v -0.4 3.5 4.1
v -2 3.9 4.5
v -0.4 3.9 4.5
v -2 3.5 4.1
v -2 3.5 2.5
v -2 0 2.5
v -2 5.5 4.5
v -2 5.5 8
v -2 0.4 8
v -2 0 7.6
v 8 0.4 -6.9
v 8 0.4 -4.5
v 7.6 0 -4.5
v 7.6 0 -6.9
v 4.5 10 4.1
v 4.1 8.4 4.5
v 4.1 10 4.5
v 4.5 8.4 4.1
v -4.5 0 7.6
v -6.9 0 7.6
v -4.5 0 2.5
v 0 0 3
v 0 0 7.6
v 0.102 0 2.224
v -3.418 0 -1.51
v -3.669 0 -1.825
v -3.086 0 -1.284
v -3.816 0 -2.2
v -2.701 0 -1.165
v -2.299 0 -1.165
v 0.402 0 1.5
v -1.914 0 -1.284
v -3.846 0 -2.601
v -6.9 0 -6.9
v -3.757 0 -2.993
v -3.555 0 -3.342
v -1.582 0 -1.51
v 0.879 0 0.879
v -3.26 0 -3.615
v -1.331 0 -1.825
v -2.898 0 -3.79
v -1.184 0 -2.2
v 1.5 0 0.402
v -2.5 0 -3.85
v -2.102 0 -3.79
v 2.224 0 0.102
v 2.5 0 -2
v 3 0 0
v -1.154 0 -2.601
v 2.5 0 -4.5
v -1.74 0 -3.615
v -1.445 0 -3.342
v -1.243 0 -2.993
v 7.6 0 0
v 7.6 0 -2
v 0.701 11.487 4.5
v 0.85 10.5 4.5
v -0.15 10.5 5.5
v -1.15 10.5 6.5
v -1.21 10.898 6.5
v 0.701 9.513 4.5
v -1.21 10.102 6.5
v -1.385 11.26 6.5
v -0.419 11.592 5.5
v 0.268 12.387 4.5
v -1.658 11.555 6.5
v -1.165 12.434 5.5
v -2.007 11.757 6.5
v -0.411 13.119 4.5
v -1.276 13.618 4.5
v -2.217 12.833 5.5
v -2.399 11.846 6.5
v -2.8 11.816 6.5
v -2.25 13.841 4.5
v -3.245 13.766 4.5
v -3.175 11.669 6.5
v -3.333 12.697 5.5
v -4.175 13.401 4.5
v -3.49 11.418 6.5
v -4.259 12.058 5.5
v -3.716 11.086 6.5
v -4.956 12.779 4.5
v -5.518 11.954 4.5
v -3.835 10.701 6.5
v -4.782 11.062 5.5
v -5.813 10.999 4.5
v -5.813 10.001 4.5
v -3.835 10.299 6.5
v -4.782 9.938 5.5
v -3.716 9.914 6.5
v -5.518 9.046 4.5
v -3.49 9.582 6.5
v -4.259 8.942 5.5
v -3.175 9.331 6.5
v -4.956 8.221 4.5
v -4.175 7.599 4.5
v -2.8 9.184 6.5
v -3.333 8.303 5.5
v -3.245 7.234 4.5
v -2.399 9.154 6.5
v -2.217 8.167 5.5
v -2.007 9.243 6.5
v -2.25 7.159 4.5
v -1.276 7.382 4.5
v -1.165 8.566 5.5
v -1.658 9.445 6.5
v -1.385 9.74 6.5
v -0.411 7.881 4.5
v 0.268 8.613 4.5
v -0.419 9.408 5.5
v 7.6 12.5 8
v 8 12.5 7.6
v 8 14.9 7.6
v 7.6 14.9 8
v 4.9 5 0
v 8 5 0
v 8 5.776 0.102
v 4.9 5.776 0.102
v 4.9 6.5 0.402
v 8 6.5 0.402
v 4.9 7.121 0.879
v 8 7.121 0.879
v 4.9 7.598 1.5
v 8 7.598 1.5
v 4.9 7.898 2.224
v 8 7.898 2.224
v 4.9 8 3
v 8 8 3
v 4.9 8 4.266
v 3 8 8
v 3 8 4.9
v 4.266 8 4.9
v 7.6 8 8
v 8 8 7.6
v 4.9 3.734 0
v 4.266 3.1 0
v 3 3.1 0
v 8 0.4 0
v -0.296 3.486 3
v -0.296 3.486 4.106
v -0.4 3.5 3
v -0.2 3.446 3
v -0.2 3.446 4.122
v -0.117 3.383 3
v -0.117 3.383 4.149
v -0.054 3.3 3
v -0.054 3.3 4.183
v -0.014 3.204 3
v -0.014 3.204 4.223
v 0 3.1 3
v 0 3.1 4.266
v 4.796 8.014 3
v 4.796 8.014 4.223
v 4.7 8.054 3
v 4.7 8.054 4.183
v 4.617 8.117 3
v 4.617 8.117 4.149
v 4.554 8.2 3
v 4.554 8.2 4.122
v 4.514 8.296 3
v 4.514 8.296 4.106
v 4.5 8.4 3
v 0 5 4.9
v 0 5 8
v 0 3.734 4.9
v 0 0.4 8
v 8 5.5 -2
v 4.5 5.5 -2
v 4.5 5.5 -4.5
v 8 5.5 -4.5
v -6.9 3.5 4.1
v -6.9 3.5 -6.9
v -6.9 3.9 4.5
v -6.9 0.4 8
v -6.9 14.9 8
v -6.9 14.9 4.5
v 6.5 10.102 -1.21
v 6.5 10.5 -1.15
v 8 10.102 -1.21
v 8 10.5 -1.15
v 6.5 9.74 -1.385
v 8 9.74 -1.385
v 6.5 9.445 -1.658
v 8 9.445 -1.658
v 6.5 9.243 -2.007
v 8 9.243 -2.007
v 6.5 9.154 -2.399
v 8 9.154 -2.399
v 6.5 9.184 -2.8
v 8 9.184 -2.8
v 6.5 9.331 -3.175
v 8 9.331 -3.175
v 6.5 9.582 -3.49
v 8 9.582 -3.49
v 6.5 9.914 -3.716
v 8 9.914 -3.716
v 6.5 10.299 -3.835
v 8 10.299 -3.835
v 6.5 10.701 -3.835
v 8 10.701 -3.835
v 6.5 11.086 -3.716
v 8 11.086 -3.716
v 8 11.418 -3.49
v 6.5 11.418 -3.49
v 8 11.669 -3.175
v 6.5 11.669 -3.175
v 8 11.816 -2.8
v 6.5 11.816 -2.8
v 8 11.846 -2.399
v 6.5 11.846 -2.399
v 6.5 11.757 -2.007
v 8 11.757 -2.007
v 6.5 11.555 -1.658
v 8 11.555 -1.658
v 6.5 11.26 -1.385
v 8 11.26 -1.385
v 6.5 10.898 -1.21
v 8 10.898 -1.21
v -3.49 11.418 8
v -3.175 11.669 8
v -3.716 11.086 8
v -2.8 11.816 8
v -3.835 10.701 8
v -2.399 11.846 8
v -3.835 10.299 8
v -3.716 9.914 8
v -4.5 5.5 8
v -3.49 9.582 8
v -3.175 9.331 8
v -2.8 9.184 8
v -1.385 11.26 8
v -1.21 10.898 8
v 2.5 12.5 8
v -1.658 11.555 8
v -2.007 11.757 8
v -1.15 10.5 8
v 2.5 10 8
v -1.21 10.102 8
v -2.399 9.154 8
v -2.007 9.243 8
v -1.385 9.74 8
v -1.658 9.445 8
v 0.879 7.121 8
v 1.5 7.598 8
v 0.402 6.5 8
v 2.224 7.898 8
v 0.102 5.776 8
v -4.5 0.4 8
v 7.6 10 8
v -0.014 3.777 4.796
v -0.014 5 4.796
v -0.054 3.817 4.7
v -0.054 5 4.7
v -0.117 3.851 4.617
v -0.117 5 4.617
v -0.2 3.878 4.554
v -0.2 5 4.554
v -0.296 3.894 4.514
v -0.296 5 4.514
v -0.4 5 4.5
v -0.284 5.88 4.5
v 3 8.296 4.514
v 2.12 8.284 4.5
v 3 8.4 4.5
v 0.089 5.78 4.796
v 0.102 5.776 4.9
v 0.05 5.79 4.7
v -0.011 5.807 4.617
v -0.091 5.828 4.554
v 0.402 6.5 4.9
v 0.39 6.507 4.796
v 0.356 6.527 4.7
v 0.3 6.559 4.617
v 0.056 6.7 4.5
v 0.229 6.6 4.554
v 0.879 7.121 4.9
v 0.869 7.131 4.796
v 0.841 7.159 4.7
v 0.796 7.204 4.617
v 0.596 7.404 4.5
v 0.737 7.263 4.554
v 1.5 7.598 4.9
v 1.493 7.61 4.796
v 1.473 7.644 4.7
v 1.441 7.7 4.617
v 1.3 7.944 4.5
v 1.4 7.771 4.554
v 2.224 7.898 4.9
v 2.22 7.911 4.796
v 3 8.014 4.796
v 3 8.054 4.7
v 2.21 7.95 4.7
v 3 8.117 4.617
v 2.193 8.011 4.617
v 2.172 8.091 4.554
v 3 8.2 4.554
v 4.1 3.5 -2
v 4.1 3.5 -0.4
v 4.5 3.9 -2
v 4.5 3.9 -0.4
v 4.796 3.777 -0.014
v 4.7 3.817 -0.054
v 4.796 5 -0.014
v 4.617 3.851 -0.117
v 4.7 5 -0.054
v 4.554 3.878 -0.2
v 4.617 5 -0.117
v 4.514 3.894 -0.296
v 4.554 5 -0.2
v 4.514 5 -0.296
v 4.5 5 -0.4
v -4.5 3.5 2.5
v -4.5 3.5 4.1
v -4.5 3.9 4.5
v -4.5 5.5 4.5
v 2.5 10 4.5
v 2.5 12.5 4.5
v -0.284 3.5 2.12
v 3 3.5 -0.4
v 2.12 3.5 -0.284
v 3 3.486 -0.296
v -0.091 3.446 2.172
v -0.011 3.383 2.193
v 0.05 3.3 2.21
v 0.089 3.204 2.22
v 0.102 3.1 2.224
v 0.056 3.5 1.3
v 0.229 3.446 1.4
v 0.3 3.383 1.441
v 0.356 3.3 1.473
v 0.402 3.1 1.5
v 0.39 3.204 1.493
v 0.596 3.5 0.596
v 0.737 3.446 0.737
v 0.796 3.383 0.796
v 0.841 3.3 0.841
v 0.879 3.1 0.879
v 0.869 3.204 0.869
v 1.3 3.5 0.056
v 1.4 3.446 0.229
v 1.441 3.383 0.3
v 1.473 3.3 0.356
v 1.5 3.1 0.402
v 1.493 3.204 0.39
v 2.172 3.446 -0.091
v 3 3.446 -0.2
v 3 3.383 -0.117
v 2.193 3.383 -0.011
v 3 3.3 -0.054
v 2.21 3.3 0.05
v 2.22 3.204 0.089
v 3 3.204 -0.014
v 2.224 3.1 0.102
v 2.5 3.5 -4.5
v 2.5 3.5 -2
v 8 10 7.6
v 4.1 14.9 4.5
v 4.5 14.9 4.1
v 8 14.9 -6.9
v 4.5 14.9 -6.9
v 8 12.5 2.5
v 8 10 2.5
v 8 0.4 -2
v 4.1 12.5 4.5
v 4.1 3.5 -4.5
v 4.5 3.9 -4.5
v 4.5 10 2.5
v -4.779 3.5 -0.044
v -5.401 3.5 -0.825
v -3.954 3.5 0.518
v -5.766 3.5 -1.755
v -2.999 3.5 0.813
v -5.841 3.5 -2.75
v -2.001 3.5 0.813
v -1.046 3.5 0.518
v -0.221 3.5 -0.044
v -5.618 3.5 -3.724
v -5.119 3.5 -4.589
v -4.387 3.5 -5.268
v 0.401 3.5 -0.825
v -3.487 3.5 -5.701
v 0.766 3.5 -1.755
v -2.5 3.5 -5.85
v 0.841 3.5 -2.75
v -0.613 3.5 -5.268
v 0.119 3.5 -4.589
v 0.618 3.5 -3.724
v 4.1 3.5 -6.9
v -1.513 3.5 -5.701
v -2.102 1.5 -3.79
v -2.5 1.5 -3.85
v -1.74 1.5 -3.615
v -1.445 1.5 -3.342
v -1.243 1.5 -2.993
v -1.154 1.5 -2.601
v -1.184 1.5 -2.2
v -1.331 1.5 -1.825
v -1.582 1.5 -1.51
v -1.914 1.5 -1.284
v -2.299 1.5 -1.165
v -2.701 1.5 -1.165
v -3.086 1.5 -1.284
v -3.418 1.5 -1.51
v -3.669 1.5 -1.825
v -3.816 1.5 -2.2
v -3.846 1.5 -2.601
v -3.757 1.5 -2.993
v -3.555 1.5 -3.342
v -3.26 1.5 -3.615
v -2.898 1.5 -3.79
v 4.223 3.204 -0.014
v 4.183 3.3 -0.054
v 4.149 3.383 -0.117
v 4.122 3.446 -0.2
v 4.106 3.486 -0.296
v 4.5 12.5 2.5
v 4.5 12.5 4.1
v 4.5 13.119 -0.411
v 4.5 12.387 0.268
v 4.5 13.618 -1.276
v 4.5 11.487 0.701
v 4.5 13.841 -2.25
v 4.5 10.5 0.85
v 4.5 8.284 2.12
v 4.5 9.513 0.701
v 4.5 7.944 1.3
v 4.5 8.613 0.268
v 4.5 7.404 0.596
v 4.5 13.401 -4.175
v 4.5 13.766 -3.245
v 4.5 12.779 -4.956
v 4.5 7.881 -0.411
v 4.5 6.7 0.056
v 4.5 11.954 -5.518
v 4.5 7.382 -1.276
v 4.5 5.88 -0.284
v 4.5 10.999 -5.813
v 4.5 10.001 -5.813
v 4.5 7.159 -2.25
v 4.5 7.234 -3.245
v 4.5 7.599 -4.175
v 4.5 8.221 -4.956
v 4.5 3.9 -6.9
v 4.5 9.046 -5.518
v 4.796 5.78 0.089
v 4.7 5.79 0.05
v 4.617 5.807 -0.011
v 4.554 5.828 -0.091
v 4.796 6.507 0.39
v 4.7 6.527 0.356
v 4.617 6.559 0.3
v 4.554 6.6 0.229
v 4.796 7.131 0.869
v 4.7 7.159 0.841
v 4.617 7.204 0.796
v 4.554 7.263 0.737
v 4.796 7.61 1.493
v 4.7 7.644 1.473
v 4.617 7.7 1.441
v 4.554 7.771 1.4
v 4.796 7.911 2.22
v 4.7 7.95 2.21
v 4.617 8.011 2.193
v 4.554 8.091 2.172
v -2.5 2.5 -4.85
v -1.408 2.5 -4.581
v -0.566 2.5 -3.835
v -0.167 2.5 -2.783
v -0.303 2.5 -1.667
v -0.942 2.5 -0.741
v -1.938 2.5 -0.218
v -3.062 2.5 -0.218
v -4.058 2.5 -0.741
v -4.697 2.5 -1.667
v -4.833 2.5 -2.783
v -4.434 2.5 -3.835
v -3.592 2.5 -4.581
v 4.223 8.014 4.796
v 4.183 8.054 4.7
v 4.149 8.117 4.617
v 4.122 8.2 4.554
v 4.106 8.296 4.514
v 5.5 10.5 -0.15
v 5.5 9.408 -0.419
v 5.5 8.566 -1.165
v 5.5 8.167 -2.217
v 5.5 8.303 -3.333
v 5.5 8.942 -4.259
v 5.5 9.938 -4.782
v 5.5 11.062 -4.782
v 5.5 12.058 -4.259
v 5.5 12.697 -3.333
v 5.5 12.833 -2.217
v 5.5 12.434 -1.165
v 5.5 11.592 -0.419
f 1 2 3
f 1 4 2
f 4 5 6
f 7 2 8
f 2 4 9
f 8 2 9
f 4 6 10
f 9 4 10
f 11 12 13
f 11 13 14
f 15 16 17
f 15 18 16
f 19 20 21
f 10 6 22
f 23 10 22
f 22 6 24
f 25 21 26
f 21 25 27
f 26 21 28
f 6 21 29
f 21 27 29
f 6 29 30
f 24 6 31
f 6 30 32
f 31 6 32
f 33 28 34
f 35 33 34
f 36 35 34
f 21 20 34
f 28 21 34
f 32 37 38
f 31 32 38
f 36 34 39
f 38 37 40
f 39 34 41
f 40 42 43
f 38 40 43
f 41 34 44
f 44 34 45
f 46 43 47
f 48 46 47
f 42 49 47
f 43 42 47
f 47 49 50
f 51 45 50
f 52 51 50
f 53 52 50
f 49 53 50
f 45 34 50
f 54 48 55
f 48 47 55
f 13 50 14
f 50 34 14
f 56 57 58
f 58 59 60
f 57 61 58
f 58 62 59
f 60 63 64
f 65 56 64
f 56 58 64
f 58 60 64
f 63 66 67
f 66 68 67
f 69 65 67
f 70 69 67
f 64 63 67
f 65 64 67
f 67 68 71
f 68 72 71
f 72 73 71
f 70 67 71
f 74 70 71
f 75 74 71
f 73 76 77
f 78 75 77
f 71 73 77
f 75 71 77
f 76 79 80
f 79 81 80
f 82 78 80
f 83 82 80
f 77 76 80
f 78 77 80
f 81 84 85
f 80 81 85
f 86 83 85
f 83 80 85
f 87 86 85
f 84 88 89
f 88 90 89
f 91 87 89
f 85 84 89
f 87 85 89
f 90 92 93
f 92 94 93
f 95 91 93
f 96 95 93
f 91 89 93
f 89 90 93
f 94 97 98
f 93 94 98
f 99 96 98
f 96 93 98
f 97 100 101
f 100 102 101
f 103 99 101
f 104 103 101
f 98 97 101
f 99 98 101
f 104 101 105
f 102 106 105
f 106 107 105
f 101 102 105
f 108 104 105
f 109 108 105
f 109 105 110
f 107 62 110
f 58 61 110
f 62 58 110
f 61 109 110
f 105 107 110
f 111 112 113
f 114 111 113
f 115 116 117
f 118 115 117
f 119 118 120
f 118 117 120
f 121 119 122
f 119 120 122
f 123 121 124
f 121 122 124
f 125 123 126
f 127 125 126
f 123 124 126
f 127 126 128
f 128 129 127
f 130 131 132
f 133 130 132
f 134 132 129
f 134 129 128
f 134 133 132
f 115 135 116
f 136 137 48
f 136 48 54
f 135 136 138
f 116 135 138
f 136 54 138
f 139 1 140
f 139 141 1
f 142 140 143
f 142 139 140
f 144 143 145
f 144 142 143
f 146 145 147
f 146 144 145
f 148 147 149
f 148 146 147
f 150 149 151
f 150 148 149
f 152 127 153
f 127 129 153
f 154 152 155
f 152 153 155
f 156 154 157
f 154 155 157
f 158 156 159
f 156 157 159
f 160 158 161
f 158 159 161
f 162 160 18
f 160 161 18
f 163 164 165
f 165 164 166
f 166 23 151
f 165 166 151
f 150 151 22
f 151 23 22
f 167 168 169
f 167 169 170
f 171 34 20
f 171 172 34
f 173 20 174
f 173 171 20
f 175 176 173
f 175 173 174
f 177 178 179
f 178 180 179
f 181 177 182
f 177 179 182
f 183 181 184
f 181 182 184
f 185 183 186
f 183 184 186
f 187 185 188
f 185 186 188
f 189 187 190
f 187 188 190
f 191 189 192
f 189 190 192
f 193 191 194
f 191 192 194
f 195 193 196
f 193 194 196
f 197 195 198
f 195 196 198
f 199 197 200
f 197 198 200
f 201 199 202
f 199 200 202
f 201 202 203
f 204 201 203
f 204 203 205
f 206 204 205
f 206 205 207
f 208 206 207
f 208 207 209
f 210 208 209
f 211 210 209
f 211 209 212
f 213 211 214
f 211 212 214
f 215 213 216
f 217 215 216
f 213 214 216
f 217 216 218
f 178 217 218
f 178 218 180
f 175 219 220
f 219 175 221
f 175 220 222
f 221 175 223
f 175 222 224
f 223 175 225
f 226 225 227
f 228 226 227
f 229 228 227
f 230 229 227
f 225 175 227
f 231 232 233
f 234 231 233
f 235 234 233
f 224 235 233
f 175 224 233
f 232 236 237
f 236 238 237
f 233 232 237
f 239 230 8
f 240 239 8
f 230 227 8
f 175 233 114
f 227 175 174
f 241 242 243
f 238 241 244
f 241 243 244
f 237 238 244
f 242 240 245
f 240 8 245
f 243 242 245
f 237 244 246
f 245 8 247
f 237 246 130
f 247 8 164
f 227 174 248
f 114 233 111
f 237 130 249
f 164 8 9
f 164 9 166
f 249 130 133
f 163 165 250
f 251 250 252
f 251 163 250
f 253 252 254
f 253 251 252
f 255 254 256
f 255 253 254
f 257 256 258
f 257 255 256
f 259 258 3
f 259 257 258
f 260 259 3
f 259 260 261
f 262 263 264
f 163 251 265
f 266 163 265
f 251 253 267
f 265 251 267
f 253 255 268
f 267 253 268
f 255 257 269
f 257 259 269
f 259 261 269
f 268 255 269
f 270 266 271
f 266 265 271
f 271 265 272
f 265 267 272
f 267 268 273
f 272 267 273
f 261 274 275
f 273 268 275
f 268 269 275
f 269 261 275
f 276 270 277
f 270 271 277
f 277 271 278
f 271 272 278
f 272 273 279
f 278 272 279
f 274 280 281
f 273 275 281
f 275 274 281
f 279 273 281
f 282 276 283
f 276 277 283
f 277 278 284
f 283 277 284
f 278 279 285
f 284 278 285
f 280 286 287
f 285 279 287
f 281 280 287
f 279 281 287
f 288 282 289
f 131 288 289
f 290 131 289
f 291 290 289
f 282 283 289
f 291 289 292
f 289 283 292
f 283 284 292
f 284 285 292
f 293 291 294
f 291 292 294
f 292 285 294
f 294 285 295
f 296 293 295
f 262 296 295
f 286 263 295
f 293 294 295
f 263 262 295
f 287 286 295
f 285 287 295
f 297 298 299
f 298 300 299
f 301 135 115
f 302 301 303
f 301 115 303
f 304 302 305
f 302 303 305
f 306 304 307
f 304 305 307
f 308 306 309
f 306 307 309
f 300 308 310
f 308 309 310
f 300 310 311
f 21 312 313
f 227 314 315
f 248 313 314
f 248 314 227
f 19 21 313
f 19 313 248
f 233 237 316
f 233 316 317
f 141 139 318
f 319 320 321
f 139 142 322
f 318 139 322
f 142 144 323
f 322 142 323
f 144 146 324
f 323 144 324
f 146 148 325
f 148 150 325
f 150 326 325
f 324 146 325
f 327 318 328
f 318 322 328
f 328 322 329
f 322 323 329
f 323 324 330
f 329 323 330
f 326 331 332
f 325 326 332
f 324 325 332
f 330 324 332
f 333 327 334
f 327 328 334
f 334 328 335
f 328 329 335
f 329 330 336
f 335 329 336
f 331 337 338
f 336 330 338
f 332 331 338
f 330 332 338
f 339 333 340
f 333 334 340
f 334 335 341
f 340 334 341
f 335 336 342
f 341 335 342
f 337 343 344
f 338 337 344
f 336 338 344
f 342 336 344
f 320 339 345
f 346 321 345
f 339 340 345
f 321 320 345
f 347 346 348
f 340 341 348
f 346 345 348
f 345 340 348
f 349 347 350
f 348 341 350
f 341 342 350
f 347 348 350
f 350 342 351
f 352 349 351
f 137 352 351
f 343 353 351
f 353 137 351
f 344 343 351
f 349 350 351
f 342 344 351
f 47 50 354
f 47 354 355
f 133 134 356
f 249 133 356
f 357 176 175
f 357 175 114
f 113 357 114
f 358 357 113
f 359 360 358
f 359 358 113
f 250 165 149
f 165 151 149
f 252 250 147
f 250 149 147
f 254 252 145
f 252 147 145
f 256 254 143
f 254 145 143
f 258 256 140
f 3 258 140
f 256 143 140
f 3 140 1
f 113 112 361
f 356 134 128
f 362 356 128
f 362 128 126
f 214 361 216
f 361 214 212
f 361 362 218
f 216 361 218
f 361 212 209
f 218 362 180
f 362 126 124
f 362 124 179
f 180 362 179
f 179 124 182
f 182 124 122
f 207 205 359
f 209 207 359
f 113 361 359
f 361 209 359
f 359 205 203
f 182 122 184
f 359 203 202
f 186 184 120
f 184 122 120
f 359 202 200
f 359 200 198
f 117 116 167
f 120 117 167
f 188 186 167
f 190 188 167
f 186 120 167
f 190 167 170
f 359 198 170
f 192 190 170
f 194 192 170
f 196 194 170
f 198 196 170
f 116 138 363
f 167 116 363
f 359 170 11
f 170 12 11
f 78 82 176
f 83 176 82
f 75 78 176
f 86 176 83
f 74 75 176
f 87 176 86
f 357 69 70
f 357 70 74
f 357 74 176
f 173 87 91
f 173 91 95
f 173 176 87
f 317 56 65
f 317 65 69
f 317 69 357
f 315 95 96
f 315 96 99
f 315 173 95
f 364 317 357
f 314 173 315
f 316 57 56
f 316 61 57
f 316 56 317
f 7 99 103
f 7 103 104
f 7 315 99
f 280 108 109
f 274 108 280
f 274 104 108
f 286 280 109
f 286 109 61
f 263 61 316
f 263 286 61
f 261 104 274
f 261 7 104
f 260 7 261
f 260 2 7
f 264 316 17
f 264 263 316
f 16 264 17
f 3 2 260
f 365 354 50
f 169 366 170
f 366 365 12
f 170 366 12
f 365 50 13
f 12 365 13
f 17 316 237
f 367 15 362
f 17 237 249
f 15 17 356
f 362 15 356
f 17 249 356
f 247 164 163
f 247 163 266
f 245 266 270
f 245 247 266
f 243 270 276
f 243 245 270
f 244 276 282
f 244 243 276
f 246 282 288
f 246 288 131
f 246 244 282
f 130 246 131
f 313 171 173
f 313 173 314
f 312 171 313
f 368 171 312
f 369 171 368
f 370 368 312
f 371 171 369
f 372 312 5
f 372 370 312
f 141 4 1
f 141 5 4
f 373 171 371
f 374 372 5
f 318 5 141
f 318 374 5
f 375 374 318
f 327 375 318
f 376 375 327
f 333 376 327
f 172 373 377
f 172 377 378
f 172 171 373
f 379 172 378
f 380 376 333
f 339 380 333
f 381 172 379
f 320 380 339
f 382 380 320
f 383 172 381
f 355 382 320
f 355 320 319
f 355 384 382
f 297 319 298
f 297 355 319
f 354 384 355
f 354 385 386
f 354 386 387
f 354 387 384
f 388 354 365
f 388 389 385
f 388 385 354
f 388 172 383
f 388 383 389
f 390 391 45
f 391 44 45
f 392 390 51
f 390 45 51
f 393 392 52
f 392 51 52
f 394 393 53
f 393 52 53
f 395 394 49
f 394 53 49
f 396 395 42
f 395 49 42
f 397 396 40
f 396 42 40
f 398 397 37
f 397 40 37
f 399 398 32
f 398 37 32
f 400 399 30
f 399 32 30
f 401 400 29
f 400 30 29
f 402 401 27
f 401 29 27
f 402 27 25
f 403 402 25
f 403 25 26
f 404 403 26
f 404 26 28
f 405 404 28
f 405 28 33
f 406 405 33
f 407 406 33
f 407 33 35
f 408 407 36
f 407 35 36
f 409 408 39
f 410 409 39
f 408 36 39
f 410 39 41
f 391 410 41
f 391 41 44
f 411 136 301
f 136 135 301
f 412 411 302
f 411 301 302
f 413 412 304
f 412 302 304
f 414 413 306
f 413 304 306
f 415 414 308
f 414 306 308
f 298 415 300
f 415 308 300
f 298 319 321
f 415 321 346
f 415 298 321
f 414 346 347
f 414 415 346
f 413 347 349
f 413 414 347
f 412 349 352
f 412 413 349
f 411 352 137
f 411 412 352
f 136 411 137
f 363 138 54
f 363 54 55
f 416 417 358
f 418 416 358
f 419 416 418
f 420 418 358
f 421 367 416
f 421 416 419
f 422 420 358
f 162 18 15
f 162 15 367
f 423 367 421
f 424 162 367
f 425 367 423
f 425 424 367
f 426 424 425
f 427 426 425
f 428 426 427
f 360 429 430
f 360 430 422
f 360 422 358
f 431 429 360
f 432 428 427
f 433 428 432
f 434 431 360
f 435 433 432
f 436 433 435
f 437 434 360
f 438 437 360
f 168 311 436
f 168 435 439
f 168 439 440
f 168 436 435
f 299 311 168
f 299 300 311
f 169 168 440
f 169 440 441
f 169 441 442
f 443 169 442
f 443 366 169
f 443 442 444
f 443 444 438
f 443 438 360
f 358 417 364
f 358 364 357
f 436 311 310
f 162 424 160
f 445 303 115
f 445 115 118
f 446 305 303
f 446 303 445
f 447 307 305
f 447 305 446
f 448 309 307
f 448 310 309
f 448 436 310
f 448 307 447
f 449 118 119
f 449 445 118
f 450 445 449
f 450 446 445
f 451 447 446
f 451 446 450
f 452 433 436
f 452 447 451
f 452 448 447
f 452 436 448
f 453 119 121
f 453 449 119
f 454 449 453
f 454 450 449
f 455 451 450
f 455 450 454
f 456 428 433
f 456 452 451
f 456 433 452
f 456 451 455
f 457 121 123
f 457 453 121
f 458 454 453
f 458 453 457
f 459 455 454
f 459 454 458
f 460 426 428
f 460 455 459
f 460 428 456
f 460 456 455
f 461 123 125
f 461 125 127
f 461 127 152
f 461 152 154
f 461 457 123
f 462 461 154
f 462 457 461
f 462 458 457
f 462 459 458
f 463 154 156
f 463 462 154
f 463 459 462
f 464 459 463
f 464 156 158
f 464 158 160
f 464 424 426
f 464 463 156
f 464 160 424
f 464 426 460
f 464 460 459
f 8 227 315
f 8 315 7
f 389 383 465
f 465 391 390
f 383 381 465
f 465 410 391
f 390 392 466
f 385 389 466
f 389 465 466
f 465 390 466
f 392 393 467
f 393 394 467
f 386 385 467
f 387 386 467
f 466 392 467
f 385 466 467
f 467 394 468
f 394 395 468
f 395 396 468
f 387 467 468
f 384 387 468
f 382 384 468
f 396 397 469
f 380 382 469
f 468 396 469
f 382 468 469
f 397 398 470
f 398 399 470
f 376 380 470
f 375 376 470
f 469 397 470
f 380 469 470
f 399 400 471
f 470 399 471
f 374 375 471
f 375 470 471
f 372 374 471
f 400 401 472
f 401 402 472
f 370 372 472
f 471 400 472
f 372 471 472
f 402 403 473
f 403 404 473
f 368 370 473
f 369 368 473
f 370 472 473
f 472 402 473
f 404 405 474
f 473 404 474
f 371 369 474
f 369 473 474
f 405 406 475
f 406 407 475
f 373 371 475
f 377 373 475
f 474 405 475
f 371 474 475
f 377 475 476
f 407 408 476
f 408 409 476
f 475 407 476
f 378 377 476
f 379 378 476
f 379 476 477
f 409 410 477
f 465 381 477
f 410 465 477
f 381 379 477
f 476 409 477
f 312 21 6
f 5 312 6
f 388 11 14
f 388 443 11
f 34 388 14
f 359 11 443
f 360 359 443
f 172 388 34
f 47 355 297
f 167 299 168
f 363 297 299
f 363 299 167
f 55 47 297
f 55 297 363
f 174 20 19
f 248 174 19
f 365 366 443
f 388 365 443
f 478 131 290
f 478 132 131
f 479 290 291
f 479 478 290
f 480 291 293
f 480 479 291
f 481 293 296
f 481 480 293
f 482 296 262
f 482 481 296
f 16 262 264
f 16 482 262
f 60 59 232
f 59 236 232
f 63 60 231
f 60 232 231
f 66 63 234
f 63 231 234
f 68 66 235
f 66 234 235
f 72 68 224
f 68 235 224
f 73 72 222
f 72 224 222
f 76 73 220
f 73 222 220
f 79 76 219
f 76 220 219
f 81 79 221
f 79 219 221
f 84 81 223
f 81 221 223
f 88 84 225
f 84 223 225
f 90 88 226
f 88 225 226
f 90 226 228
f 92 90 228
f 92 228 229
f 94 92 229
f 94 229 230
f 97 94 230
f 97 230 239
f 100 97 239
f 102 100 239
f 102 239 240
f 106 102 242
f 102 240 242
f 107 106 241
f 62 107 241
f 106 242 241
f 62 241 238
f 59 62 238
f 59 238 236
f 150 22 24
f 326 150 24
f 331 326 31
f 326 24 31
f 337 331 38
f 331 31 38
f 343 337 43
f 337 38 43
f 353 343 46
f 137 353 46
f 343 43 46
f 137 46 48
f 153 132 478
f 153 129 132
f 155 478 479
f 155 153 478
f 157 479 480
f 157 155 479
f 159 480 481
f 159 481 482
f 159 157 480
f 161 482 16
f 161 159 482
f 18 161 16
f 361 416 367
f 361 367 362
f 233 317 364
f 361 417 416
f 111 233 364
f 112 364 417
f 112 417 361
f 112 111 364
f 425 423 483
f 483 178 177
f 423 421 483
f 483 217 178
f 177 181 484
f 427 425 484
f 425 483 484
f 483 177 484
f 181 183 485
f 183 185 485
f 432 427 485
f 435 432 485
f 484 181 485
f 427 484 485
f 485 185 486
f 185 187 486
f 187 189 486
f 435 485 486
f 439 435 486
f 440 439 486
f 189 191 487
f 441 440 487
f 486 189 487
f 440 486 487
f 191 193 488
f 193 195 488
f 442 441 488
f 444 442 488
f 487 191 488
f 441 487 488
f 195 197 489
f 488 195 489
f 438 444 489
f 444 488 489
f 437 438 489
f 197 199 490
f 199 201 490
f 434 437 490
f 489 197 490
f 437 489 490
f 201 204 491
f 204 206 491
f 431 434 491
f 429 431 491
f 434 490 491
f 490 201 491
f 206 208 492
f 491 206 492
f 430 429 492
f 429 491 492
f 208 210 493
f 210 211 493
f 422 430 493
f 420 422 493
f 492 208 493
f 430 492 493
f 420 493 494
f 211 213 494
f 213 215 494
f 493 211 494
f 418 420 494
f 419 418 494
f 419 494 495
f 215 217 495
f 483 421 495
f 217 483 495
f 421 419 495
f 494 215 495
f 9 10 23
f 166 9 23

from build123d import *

# Parameters (mm, degrees)
ESQUISSE1_W                                        = 16
ESQUISSE1_H                                        = 16
BOSS_EXTRU_1_DEPTH                                 = 16
COQUE2_T                                           = -3.5
ESQUISSE2_W                                        = 2.5
ESQUISSE2_H                                        = 5.5
ESQUISSE2_W_2                                      = 5.5
ESQUISSE2_H_2                                      = 2.5
ENL_V_MAT_EXTRU_1_DEPTH                            = 5.5
ESQUISSE3_W                                        = 5.5
ESQUISSE3_H                                        = 2.5
ENL_V_MAT_EXTRU_2_DEPTH                            = 5.5
ENL_V_MAT_EXTRU_3_DEPTH                            = 3.5
ENL_V_MAT_EXTRU_4_DEPTH                            = 3.5
ENL_V_MAT_EXTRU_5_DEPTH                            = 3.5
FRAISAGE_POUR_VIS_T_TE_FRAIS_E_M2_51_D             = 2.7
FRAISAGE_POUR_VIS_T_TE_FRAIS_E_M2_51_CSINK_D       = 6.7
FRAISAGE_POUR_VIS_T_TE_FRAIS_E_M2_51_CSINK_ANGLE   = 90
FRAISAGE_POUR_VIS_T_TE_FRAIS_E_M2_51_O_D           = 2.7
FRAISAGE_POUR_VIS_T_TE_FRAIS_E_M2_51_O_CSINK_D     = 6.7
FRAISAGE_POUR_VIS_T_TE_FRAIS_E_M2_51_O_CSINK_ANGLE = 90
FRAISAGE_POUR_VIS_T_TE_FRAIS_E_M2_2_D              = 2.7
FRAISAGE_POUR_VIS_T_TE_FRAIS_E_M2_2_CSINK_D        = 6.7
FRAISAGE_POUR_VIS_T_TE_FRAIS_E_M2_2_CSINK_ANGLE    = 90
ENL_V_MAT_EXTRU_6_DEPTH                            = 1.1
ENL_V_MAT_EXTRU_7_DEPTH                            = 1.1
ENL_V_MAT_EXTRU_8_DEPTH                            = 1.1
CHANFREIN1_SIZE                                    = 0.4
CONG_1_R                                           = 0.4


with BuildPart() as part:
    # Esquisse1 → Boss.-Extru.1 (new body)
    with BuildSketch(Plane(origin=(0, 0, 0), x_dir=(1, 0, 0), z_dir=(0, 1, 0))):
        Rectangle(ESQUISSE1_W, ESQUISSE1_H)
    extrude(amount=BOSS_EXTRU_1_DEPTH)

    # Coque2
    coque2_openings = [part.faces().sort_by_distance(p)[0] for p in [
        (0, 16, 0),
        (-8, 8, 0),
        (0, 8, -8),
    ]]
    offset(amount=COQUE2_T, openings=coque2_openings, kind=Kind.INTERSECTION)

    # Esquisse2 → Enlèv. mat.-Extru.1 (cut)
    with BuildSketch(Plane.XZ):
        with Locations((-3.25, 5.25)):
            Rectangle(ESQUISSE2_W, ESQUISSE2_H)
        with Locations((5.25, -3.25)):
            Rectangle(ESQUISSE2_W_2, ESQUISSE2_H_2)
    extrude(amount=-ENL_V_MAT_EXTRU_1_DEPTH, mode=Mode.SUBTRACT)

    # Esquisse3 → Enlèv. mat.-Extru.2 (cut)
    with BuildSketch(Plane.XY.offset(8)):
        with Locations((5.25, 11.25)):
            Rectangle(ESQUISSE3_W, ESQUISSE3_H)
    extrude(amount=-ENL_V_MAT_EXTRU_2_DEPTH, mode=Mode.SUBTRACT)

    # Esquisse7 → Enlèv. mat.-Extru.3 (cut)
    with BuildSketch(Plane.XZ):
        with BuildLine():
            Line((3, 0), (8, 0))
            Line((8, 0), (8, 8))
            Line((8, 8), (0, 8))
            Line((0, 8), (0, 3))
            ThreePointArc((0, 3), (0.878679656, 0.878679656), (3, 0))
        make_face()
    extrude(amount=-ENL_V_MAT_EXTRU_3_DEPTH, mode=Mode.SUBTRACT)

    # Esquisse8 → Enlèv. mat.-Extru.4 (cut)
    with BuildSketch(Plane.XY.offset(8)):
        with BuildLine():
            Line((3, 8), (8, 8))
            Line((8, 8), (8, 0))
            Line((8, 0), (0, 0))
            Line((0, 0), (0, 5))
            ThreePointArc((0, 5), (0.878679656, 7.121320344), (3, 8))
        make_face()
    extrude(amount=-ENL_V_MAT_EXTRU_4_DEPTH, mode=Mode.SUBTRACT)

    # Esquisse9 → Enlèv. mat.-Extru.5 (cut)
    with BuildSketch(Plane(origin=(8, 0, 0), x_dir=(0, 0, -1), z_dir=(1, 0, 0))):
        with BuildLine():
            Line((-3, 8), (-8, 8))
            Line((-8, 8), (-8, 0))
            Line((-8, 0), (0, 0))
            Line((0, 0), (0, 5))
            ThreePointArc((0, 5), (-0.878679656, 7.121320344), (-3, 8))
        make_face()
    extrude(amount=-ENL_V_MAT_EXTRU_5_DEPTH, mode=Mode.SUBTRACT)

    # Fraisage pour vis à tête fraisée M2.51 (through all)
    with Locations(Plane(origin=(4.5, 10.5, -2.5), x_dir=(0, 0, -1), z_dir=(-1, 0, 0))):
        with Locations((0, 0)):
            CounterSinkHole(FRAISAGE_POUR_VIS_T_TE_FRAIS_E_M2_51_D / 2, FRAISAGE_POUR_VIS_T_TE_FRAIS_E_M2_51_CSINK_D / 2, counter_sink_angle=FRAISAGE_POUR_VIS_T_TE_FRAIS_E_M2_51_CSINK_ANGLE)

    # Fraisage pour vis à tête fraisée M2.51 o (through all)
    with Locations(Plane(origin=(-2.5, 10.5, 4.5), x_dir=(-1, 0, 0), z_dir=(0, 0, -1))):
        with Locations((0, 0)):
            CounterSinkHole(FRAISAGE_POUR_VIS_T_TE_FRAIS_E_M2_51_O_D / 2, FRAISAGE_POUR_VIS_T_TE_FRAIS_E_M2_51_O_CSINK_D / 2, counter_sink_angle=FRAISAGE_POUR_VIS_T_TE_FRAIS_E_M2_51_O_CSINK_ANGLE)

    # Fraisage pour vis _ t_te frais_e M2. 2 (through all)
    with Locations(Plane(origin=(-2.5, 3.5, -2.5), x_dir=(0, 0, 1), z_dir=(0, 1, 0))):
        with Locations((0, 0)):
            CounterSinkHole(FRAISAGE_POUR_VIS_T_TE_FRAIS_E_M2_2_D / 2, FRAISAGE_POUR_VIS_T_TE_FRAIS_E_M2_2_CSINK_D / 2, counter_sink_angle=FRAISAGE_POUR_VIS_T_TE_FRAIS_E_M2_2_CSINK_ANGLE)

    # Esquisse10 → Enlèv. mat.-Extru.6 (cut)
    with BuildSketch(Plane(origin=(0, 16, 0), x_dir=(1, 0, 0), z_dir=(0, 1, 0))):
        Polygon((4.5, 8), (4.5, -4.5), (-8, -4.5), (-8, -8), (8, -8), (8, 8), align=None)
    extrude(amount=-ENL_V_MAT_EXTRU_6_DEPTH, mode=Mode.SUBTRACT)

    # Esquisse11 → Enlèv. mat.-Extru.7 (cut)
    with BuildSketch(Plane(origin=(0, 0, -8), x_dir=(-1, 0, 0), z_dir=(0, 0, -1))):
        Polygon((-4.5, 14.9), (-8, 14.9), (-8, 0), (8, 0), (8, 3.5), (-4.5, 3.5), align=None)
    extrude(amount=-ENL_V_MAT_EXTRU_7_DEPTH, mode=Mode.SUBTRACT)

    # Esquisse13 → Enlèv. mat.-Extru.8 (cut)
    with BuildSketch(Plane.ZY.offset(8)):
        Polygon((-6.9, 3.5), (-6.9, 0), (8, 0), (8, 14.9), (4.5, 14.9), (4.5, 3.5), align=None)
    extrude(amount=-ENL_V_MAT_EXTRU_8_DEPTH, mode=Mode.SUBTRACT)

    # Chanfrein1
    chanfrein1_edges = [part.edges().sort_by_distance(p)[0] for p in [
        (4.5, 13.7, 4.5),
        (8, 13.7, 8),
        (-5.7, 3.5, 4.5),
        (-5.7, 0, 8),
        (4.5, 3.5, -5.7),
        (-1, 3.5, 4.5),
        (8, 0, -5.7),
        (-1, 0, 8),
        (4.5, 9, 4.5),
        (8, 9, 8),
        (4.5, 3.5, -1),
        (8, 0, -1),
    ]]
    chamfer(chanfrein1_edges, length=CHANFREIN1_SIZE)

    # Congé1
    cong_1_edges = [part.edges().sort_by_distance(p)[0] for p in [
        (0.878679656, 3.5, 0.878679656),
        (0, 4.45, 4.5),
        (0.878679656, 7.121320344, 4.5),
        (4.5, 8, 3.55),
        (4.5, 7.121320344, 0.878679656),
        (3.55, 8, 4.5),
        (4.5, 4.45, 0),
        (4.3, 8, 4.3),
        (0, 3.7, 4.3),
        (4.3, 3.7, 0),
        (0, 3.5, 3.55),
        (3.55, 3.5, 0),
    ]]
    fillet(cong_1_edges, radius=CONG_1_R)


solid = part.part
